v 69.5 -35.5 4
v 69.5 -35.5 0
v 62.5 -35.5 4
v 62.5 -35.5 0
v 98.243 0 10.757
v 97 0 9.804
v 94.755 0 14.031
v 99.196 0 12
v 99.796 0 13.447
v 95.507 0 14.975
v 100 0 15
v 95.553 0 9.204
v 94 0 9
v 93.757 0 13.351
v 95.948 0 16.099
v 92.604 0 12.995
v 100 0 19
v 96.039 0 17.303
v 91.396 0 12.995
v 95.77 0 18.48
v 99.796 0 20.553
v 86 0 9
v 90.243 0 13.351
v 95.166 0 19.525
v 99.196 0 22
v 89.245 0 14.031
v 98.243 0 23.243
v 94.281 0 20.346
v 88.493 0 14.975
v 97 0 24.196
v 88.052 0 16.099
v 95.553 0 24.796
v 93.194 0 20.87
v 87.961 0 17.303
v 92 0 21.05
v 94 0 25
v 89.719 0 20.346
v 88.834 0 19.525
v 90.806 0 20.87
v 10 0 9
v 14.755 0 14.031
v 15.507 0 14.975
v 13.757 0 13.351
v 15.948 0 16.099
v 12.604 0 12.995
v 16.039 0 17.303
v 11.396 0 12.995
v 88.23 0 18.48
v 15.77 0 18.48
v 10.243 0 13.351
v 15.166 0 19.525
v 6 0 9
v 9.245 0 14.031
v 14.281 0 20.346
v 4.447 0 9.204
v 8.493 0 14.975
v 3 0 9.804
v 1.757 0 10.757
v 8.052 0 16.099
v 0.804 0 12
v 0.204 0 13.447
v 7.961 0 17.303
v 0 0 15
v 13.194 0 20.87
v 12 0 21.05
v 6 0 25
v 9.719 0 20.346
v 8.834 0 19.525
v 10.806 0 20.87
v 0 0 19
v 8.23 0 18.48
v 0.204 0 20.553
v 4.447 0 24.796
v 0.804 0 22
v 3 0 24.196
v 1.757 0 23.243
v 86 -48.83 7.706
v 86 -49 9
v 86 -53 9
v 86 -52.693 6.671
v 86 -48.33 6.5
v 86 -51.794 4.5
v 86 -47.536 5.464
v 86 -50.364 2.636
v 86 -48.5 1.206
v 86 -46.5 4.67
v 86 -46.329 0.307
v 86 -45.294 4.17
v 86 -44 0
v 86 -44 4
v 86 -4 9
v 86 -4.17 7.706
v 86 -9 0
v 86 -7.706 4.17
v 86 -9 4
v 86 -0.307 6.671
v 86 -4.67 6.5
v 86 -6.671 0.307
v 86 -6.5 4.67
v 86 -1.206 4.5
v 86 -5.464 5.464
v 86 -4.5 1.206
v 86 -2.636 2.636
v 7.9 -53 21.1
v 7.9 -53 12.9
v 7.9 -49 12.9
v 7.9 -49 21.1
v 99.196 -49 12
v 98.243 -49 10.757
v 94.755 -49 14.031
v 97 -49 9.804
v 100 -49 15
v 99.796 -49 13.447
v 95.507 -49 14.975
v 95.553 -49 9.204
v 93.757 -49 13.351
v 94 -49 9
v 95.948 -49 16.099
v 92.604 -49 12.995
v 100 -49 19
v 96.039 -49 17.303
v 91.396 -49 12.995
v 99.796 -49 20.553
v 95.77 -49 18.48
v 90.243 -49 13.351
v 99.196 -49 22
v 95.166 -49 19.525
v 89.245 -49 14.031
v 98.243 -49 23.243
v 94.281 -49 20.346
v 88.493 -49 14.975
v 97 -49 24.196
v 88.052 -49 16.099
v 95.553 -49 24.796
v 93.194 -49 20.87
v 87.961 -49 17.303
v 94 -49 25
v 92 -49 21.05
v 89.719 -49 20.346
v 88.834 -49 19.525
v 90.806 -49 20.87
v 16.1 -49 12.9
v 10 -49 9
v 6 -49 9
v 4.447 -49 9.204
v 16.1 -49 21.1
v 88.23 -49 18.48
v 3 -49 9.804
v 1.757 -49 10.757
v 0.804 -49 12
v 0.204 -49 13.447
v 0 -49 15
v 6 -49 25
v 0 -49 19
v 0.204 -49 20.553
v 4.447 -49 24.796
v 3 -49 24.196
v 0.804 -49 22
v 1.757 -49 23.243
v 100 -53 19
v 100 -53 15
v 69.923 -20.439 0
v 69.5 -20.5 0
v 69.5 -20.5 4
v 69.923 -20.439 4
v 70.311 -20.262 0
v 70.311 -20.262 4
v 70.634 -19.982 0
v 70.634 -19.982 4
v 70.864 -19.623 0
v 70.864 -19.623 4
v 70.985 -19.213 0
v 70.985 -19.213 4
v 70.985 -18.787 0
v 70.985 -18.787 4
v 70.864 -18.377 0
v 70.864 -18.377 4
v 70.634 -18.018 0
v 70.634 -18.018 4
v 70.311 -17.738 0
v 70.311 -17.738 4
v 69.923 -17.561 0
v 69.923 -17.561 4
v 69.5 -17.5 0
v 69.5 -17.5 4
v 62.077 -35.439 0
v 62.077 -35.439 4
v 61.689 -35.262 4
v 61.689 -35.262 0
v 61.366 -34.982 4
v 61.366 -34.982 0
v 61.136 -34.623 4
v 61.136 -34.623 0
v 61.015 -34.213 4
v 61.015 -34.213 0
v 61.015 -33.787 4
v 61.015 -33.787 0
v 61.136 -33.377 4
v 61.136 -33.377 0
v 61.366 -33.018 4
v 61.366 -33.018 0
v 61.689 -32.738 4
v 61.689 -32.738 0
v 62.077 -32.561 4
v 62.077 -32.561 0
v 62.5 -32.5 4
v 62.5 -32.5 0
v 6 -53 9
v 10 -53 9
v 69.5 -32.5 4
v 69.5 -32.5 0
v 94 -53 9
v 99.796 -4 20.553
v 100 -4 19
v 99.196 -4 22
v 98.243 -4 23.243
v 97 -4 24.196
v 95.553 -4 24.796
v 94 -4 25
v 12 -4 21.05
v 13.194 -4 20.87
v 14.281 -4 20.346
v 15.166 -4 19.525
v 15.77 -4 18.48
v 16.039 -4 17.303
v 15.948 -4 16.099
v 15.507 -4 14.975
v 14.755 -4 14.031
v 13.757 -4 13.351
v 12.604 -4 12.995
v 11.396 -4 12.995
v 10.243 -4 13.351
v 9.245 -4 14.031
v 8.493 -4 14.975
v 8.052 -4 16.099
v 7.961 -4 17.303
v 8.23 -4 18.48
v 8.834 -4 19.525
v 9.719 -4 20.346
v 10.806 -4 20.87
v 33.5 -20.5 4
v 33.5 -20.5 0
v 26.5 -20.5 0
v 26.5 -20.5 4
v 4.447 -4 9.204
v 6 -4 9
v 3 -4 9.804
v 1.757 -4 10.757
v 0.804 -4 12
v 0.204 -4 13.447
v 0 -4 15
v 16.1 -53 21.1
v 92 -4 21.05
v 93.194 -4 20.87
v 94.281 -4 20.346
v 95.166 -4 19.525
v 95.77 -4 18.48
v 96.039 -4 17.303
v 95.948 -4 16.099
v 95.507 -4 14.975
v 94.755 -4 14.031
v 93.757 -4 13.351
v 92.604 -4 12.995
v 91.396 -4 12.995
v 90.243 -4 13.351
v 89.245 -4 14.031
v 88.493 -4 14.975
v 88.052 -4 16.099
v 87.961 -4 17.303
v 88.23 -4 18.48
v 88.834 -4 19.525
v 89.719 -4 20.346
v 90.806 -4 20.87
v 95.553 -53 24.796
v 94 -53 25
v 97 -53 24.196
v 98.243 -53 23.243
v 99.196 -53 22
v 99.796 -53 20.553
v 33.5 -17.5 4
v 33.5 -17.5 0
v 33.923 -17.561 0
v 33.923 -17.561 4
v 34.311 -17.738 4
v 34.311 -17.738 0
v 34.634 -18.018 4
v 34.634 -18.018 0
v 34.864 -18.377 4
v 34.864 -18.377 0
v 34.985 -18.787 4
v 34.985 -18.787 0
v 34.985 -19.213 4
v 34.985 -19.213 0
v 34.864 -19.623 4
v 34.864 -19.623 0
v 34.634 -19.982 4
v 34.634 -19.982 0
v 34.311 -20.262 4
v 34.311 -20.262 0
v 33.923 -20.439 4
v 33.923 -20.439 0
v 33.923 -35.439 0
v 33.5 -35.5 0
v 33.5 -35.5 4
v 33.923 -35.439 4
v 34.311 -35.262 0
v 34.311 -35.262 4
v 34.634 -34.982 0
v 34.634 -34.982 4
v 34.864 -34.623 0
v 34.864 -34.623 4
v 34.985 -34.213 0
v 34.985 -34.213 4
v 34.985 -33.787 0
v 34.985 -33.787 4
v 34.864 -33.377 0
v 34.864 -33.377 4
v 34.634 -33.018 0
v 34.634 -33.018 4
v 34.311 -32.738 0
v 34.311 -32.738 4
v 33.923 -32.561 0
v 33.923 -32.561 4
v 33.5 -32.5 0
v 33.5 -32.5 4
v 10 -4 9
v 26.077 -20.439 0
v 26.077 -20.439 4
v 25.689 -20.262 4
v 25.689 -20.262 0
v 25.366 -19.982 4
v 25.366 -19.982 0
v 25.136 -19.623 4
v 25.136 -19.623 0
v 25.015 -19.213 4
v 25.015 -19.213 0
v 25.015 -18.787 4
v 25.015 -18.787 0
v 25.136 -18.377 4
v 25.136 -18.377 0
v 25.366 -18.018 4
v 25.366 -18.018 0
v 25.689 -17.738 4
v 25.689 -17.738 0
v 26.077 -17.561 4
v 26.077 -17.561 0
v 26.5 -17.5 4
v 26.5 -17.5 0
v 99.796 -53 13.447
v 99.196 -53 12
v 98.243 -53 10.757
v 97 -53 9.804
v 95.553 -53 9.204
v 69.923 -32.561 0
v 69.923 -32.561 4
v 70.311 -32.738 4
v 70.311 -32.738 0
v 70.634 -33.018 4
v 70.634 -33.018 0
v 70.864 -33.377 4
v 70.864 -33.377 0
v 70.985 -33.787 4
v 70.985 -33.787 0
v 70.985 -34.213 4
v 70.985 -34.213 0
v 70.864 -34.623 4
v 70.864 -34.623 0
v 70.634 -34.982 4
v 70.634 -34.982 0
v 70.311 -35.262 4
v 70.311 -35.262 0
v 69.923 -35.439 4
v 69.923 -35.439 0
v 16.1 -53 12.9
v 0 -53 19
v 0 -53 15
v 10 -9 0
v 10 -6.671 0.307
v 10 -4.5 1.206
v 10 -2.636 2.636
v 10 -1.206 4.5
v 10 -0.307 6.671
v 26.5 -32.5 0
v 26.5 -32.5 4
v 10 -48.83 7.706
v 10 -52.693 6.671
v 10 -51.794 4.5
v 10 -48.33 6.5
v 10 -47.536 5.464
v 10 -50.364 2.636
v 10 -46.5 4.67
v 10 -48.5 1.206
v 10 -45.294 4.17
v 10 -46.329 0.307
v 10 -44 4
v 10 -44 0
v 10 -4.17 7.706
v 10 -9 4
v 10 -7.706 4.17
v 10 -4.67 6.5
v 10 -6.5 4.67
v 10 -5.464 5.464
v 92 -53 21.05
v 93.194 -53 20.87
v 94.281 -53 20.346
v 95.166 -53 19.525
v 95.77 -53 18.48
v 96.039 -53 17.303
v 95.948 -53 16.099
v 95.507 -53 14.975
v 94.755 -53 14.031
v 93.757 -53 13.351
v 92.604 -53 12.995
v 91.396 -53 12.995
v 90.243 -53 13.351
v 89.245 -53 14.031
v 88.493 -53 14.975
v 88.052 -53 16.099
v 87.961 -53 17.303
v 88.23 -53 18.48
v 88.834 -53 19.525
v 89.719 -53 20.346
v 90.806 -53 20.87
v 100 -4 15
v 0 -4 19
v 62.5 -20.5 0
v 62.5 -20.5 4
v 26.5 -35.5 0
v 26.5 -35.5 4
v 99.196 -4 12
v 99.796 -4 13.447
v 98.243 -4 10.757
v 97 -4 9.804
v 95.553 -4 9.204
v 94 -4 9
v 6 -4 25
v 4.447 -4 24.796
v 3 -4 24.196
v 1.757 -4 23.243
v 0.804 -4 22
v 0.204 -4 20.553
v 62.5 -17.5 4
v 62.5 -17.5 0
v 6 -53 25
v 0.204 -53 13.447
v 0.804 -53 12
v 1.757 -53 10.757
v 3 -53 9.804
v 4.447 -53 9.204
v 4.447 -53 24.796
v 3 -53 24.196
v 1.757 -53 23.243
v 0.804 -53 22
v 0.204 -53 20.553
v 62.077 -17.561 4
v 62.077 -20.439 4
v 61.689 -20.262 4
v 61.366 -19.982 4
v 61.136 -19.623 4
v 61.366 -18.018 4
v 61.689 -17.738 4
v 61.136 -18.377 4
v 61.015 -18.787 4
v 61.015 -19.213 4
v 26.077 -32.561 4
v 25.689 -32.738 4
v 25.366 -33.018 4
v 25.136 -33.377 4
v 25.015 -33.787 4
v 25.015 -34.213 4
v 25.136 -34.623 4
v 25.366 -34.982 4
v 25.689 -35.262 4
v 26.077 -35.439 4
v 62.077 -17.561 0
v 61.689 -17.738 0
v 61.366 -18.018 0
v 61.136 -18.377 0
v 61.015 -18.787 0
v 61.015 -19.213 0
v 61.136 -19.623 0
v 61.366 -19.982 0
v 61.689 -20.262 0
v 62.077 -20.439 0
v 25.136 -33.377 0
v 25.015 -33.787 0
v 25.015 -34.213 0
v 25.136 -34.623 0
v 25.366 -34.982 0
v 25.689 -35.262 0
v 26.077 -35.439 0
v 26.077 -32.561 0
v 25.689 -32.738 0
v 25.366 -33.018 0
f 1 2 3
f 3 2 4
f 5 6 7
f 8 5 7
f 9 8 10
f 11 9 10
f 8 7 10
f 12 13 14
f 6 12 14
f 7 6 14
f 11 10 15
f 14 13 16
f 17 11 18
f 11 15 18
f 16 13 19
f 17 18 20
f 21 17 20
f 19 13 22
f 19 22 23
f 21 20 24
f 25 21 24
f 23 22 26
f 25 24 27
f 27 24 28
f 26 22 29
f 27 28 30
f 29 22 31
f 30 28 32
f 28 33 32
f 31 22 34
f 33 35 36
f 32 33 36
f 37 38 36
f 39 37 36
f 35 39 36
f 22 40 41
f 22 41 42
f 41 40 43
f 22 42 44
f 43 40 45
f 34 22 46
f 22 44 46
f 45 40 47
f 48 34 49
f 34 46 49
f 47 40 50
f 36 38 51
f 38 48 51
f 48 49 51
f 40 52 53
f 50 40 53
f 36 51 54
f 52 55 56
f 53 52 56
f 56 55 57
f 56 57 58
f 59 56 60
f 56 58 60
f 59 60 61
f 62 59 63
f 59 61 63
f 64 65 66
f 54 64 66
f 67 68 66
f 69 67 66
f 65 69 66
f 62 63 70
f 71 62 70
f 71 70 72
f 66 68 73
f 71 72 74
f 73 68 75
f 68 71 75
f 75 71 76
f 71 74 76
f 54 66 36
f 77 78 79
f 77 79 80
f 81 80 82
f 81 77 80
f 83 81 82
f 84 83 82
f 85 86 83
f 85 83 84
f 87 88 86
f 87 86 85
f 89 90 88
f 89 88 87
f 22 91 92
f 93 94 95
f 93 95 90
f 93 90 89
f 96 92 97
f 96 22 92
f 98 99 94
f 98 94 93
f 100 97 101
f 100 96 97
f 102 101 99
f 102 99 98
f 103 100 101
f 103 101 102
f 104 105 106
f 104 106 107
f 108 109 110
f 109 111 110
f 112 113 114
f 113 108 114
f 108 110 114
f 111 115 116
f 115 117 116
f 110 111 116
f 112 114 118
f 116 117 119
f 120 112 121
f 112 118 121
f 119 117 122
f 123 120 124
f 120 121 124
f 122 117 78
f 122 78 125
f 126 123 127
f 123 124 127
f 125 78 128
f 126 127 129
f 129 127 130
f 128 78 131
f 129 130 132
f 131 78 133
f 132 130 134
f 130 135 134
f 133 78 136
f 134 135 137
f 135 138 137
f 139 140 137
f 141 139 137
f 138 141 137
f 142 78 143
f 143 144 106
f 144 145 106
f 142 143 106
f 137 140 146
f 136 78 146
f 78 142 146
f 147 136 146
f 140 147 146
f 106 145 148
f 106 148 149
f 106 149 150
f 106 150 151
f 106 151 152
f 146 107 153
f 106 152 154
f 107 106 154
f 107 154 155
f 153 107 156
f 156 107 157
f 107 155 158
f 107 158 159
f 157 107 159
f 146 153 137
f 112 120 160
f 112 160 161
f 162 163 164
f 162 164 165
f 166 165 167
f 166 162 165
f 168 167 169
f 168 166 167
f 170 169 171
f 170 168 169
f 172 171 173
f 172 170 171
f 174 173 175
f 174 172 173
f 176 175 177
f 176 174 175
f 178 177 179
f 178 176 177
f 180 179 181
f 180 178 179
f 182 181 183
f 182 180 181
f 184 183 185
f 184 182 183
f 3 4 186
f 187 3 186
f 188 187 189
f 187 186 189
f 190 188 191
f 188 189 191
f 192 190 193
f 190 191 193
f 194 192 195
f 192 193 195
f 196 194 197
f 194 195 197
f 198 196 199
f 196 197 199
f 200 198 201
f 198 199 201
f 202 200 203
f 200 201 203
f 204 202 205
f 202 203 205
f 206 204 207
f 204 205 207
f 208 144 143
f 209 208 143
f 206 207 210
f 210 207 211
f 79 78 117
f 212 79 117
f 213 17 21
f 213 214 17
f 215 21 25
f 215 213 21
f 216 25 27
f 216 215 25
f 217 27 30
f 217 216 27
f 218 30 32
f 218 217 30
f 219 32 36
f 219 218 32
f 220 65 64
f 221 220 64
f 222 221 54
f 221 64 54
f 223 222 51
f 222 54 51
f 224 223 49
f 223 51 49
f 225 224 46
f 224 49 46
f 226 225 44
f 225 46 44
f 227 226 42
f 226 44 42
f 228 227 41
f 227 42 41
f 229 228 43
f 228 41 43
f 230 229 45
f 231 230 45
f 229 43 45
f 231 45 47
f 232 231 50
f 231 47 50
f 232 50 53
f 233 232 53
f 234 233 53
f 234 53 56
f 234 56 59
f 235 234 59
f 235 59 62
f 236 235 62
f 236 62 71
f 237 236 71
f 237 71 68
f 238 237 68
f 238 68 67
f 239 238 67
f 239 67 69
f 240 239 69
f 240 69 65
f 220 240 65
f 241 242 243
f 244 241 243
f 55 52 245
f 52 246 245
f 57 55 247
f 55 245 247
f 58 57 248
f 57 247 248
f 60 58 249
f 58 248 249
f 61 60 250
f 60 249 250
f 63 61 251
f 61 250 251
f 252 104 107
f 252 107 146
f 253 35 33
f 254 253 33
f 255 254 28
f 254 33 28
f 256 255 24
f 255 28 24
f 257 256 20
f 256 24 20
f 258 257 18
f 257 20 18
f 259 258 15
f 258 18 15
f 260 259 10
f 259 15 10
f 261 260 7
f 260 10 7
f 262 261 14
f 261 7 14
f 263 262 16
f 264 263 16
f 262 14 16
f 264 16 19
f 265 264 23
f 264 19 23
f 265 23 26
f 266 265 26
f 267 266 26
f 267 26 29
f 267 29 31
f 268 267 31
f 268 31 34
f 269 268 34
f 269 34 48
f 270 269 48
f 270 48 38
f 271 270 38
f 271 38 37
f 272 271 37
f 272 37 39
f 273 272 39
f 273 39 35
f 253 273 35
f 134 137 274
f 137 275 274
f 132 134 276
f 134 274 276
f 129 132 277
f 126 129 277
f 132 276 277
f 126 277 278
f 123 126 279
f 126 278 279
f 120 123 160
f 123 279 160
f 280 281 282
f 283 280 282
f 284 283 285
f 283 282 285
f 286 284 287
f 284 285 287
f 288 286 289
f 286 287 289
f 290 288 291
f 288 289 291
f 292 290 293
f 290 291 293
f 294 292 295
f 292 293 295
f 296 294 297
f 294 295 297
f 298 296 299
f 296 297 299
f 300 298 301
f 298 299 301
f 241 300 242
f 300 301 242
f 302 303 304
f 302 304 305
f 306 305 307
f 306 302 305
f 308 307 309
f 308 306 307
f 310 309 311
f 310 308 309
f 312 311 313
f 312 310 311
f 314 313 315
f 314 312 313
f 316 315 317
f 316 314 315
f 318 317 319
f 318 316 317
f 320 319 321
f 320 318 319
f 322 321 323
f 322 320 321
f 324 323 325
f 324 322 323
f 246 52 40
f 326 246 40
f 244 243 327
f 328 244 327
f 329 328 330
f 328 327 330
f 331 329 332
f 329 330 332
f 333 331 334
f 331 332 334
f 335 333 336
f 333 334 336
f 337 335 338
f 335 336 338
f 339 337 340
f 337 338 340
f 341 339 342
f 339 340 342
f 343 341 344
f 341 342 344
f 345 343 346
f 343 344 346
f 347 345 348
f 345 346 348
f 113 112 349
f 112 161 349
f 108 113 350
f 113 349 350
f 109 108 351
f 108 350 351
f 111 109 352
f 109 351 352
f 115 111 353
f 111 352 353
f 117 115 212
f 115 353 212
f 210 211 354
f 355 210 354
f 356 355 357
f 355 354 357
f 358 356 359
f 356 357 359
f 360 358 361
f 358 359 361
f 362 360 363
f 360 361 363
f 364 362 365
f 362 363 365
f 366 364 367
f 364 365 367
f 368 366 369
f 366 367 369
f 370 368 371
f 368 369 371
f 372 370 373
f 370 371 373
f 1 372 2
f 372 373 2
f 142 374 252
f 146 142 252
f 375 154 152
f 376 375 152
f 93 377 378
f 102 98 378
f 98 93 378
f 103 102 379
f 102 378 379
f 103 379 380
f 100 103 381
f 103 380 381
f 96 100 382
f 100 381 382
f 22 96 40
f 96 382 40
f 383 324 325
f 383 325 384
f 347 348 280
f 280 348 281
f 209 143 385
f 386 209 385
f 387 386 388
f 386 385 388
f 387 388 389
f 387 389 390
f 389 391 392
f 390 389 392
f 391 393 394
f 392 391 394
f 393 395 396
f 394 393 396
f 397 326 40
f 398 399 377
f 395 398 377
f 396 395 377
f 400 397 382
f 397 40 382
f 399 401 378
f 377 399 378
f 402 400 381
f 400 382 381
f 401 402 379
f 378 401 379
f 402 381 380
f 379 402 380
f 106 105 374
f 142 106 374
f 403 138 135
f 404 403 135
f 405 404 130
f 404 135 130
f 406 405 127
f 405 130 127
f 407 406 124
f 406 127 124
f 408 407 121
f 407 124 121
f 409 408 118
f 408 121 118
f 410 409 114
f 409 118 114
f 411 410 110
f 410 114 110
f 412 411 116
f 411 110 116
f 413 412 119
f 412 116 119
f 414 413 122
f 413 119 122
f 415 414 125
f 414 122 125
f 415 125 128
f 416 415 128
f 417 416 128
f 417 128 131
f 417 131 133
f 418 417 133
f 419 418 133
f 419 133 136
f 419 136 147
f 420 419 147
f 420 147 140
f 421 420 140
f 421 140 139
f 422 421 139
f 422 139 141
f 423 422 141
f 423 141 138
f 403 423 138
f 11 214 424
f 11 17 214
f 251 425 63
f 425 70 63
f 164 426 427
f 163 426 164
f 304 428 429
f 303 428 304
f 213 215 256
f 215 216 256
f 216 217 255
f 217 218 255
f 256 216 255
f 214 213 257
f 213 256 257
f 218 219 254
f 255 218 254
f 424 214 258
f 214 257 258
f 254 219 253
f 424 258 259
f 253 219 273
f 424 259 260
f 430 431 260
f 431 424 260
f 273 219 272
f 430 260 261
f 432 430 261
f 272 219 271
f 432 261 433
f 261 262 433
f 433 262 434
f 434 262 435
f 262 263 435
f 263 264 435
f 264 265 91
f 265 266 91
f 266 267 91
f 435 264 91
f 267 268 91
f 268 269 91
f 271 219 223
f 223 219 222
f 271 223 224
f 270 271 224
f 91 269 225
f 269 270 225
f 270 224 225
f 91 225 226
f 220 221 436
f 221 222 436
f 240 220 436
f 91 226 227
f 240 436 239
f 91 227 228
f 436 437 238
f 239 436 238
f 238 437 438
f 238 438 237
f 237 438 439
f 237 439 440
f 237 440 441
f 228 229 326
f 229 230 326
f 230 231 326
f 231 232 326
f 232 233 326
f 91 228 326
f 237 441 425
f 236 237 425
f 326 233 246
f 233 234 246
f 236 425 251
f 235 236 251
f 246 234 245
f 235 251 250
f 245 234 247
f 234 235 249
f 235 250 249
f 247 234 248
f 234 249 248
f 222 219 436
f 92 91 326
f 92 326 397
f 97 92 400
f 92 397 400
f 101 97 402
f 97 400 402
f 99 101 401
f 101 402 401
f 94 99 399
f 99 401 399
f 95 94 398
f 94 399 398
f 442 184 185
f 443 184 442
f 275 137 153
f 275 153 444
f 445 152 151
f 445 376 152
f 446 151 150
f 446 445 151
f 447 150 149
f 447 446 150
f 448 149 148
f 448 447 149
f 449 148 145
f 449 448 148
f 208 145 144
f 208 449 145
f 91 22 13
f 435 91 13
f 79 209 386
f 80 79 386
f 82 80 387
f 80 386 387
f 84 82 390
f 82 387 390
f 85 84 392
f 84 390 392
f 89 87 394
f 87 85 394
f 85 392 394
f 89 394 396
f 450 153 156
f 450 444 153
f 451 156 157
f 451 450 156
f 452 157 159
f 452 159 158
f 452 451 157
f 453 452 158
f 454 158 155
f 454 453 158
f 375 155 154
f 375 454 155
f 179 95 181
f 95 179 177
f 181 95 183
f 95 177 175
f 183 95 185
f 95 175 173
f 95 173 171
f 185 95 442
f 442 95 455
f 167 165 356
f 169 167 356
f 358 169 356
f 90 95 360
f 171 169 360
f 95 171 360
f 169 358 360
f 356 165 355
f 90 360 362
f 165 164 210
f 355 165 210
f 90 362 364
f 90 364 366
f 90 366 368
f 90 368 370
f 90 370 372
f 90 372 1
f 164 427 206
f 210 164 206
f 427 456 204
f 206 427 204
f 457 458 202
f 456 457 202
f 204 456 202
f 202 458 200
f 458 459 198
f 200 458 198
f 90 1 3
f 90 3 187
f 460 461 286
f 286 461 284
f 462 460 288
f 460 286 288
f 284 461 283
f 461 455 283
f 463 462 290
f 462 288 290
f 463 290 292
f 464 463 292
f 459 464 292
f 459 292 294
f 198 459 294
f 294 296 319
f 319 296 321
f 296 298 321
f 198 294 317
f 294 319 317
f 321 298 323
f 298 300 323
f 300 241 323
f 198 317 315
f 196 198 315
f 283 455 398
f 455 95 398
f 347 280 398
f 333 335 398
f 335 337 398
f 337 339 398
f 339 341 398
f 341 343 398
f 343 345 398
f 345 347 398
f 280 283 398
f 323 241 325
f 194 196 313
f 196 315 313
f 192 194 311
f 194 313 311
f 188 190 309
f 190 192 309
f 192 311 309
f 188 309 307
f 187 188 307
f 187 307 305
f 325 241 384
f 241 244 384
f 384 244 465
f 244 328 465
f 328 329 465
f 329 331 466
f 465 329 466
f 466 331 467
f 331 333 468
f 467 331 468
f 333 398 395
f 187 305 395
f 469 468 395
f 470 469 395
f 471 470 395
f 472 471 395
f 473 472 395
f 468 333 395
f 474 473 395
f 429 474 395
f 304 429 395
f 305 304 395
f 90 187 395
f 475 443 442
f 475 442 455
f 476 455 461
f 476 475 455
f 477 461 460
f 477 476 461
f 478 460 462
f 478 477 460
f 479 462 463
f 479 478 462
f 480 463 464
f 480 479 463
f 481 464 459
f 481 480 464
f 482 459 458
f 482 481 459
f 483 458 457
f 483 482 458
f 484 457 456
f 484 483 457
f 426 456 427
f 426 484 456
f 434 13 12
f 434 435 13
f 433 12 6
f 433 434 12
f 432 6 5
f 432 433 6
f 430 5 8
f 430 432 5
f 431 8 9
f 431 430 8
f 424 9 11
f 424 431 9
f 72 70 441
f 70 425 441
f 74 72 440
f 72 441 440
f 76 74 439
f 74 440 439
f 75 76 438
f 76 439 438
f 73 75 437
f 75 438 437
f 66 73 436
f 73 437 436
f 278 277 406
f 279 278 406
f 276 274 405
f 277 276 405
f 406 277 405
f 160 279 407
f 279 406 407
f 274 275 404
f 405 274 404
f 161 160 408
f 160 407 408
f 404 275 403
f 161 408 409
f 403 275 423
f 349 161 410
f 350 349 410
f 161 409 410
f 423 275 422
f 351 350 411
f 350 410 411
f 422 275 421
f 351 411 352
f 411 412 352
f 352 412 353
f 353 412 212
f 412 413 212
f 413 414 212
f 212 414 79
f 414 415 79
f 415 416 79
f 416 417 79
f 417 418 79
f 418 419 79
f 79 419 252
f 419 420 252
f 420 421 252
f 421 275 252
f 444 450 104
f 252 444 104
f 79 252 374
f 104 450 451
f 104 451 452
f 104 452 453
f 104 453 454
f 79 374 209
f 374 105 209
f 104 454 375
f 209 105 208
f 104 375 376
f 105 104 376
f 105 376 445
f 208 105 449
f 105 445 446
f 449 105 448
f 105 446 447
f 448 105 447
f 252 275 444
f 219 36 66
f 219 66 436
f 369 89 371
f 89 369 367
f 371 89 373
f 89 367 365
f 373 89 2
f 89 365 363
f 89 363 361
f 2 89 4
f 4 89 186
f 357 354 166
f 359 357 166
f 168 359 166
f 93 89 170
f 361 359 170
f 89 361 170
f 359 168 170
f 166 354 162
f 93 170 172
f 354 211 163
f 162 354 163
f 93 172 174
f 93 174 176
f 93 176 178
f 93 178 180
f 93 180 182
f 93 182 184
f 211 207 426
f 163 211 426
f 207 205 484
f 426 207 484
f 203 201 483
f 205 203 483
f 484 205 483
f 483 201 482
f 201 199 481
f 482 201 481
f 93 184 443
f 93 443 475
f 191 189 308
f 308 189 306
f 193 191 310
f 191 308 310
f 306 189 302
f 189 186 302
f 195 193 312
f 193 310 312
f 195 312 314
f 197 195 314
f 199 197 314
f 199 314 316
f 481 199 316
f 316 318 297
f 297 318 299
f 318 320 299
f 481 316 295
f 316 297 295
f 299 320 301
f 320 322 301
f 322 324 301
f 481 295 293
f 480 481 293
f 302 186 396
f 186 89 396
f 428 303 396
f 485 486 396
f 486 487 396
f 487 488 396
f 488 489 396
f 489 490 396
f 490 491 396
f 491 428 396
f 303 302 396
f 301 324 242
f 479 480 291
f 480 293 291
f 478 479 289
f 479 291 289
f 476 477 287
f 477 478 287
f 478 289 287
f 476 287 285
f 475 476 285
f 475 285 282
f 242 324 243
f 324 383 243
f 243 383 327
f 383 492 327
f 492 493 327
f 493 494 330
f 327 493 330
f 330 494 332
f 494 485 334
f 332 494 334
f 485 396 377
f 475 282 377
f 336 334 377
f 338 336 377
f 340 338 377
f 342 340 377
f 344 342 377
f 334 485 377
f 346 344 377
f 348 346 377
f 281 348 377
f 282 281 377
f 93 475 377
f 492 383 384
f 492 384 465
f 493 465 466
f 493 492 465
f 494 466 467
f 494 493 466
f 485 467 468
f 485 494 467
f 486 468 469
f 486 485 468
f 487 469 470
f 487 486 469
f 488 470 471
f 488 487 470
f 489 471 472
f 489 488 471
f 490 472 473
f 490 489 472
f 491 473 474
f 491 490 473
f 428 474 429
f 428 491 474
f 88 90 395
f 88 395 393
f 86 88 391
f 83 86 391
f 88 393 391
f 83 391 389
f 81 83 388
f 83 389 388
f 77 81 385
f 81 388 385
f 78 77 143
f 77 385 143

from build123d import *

# Parameters (mm, degrees)
SM_BASE_FLANGE_1_DEPTH = 100
SKETCH_4_R             = 4.05
CUT_EXTRUDE_1_DEPTH    = 116.905133622
SKETCH_5_W             = 10
SKETCH_5_H             = 9
SKETCH_5_W_2           = 14
CUT_EXTRUDE_2_DEPTH    = 116.905133622
FILLET_1_R             = 6
SKETCH_7_W             = 8.2
SKETCH_7_H             = 8.2
CUT_EXTRUDE_4_DEPTH    = 4
CUT_EXTRUDE_5_DEPTH    = 4


# Sheet-metal steps are written as plain solids
with BuildPart() as part:
    # Sketch 1 → Базовая кромка1 (new body)
    with BuildSketch(Plane(origin=(0, 0, 0), x_dir=(0, 0, -1), z_dir=(1, 0, 0))):
        with BuildLine():
            Line((-25, -53), (-9, -53))
            ThreePointArc((-9, -53), (-2.636038969, -50.363961031), (0, -44))
            Line((0, -44), (0, -9))
            ThreePointArc((0, -9), (-2.636038969, -2.636038969), (-9, 0))
            Line((-9, 0), (-25, 0))
            Line((-25, 0), (-25, -4))
            Line((-25, -4), (-9, -4))
            ThreePointArc((-9, -4), (-5.464466094, -5.464466094), (-4, -9))
            Line((-4, -9), (-4, -44))
            ThreePointArc((-4, -44), (-5.464466094, -47.535533906), (-9, -49))
            Line((-9, -49), (-25, -49))
            Line((-25, -49), (-25, -53))
        make_face()
    extrude(amount=SM_BASE_FLANGE_1_DEPTH)

    # Эскиз4 → Вырез-Вытянуть1 (cut, through all)
    with BuildSketch(Plane(origin=(0, 0, 0), x_dir=(1, 0, 0), z_dir=(0, 1, 0))):
        with Locations(Location((12, -17, 0), (0, 0, 270))):
            Circle(SKETCH_4_R)
        with Locations(Location((92, -17, 0), (0, 0, 270))):
            Circle(SKETCH_4_R)
    extrude(amount=-CUT_EXTRUDE_1_DEPTH, mode=Mode.SUBTRACT)

    # Эскиз5 → Вырез-Вытянуть2 (cut, through all)
    with BuildSketch(Plane(origin=(0, 0, 0), x_dir=(1, 0, 0), z_dir=(0, 1, 0))):
        with Locations((5, -4.5)):
            Rectangle(SKETCH_5_W, SKETCH_5_H)
        with Locations((93, -4.5)):
            Rectangle(SKETCH_5_W_2, SKETCH_5_H)
    extrude(amount=-CUT_EXTRUDE_2_DEPTH, mode=Mode.SUBTRACT)

    # Скругление1
    fillet_1_edges = [part.edges().sort_by_distance(p)[0] for p in [
        (0, -51, 25),
        (0, -2, 25),
        (100, -51, 25),
        (0, -2, 9),
        (100, -2, 9),
        (0, -51, 9),
        (100, -51, 9),
        (100, -2, 25),
    ]]
    fillet(fillet_1_edges, radius=FILLET_1_R)

    # Эскиз7 → Вырез-Вытянуть4 (cut)
    with BuildSketch(Plane.XZ.offset(53)):
        with Locations((12, 17)):
            Rectangle(SKETCH_7_W, SKETCH_7_H)
    extrude(amount=-CUT_EXTRUDE_4_DEPTH, mode=Mode.SUBTRACT)

    # Эскиз8 → Вырез-Вытянуть5 (cut)
    with BuildSketch(Plane(origin=(0, 0, 0), x_dir=(-1, 0, 0), z_dir=(0, 0, -1))):
        with BuildLine():
            Line((-69.5, -17.5), (-62.5, -17.5))
            ThreePointArc((-62.5, -17.5), (-61, -19), (-62.5, -20.5))
            Line((-62.5, -20.5), (-69.5, -20.5))
            ThreePointArc((-69.5, -20.5), (-71, -19), (-69.5, -17.5))
        make_face()
        with BuildLine():
            Line((-26.5, -17.5), (-33.5, -17.5))
            ThreePointArc((-33.5, -17.5), (-35, -19), (-33.5, -20.5))
            Line((-33.5, -20.5), (-26.5, -20.5))
            ThreePointArc((-26.5, -20.5), (-25, -19), (-26.5, -17.5))
        make_face()
        with BuildLine():
            Line((-26.5, -35.5), (-33.5, -35.5))
            ThreePointArc((-33.5, -35.5), (-35, -34), (-33.5, -32.5))
            Line((-33.5, -32.5), (-26.5, -32.5))
            ThreePointArc((-26.5, -32.5), (-25, -34), (-26.5, -35.5))
        make_face()
        with BuildLine():
            Line((-69.5, -35.5), (-62.5, -35.5))
            ThreePointArc((-62.5, -35.5), (-61, -34), (-62.5, -32.5))
            Line((-62.5, -32.5), (-69.5, -32.5))
            ThreePointArc((-69.5, -32.5), (-71, -34), (-69.5, -35.5))
        make_face()
    extrude(amount=-CUT_EXTRUDE_5_DEPTH, mode=Mode.SUBTRACT)


solid = part.part
